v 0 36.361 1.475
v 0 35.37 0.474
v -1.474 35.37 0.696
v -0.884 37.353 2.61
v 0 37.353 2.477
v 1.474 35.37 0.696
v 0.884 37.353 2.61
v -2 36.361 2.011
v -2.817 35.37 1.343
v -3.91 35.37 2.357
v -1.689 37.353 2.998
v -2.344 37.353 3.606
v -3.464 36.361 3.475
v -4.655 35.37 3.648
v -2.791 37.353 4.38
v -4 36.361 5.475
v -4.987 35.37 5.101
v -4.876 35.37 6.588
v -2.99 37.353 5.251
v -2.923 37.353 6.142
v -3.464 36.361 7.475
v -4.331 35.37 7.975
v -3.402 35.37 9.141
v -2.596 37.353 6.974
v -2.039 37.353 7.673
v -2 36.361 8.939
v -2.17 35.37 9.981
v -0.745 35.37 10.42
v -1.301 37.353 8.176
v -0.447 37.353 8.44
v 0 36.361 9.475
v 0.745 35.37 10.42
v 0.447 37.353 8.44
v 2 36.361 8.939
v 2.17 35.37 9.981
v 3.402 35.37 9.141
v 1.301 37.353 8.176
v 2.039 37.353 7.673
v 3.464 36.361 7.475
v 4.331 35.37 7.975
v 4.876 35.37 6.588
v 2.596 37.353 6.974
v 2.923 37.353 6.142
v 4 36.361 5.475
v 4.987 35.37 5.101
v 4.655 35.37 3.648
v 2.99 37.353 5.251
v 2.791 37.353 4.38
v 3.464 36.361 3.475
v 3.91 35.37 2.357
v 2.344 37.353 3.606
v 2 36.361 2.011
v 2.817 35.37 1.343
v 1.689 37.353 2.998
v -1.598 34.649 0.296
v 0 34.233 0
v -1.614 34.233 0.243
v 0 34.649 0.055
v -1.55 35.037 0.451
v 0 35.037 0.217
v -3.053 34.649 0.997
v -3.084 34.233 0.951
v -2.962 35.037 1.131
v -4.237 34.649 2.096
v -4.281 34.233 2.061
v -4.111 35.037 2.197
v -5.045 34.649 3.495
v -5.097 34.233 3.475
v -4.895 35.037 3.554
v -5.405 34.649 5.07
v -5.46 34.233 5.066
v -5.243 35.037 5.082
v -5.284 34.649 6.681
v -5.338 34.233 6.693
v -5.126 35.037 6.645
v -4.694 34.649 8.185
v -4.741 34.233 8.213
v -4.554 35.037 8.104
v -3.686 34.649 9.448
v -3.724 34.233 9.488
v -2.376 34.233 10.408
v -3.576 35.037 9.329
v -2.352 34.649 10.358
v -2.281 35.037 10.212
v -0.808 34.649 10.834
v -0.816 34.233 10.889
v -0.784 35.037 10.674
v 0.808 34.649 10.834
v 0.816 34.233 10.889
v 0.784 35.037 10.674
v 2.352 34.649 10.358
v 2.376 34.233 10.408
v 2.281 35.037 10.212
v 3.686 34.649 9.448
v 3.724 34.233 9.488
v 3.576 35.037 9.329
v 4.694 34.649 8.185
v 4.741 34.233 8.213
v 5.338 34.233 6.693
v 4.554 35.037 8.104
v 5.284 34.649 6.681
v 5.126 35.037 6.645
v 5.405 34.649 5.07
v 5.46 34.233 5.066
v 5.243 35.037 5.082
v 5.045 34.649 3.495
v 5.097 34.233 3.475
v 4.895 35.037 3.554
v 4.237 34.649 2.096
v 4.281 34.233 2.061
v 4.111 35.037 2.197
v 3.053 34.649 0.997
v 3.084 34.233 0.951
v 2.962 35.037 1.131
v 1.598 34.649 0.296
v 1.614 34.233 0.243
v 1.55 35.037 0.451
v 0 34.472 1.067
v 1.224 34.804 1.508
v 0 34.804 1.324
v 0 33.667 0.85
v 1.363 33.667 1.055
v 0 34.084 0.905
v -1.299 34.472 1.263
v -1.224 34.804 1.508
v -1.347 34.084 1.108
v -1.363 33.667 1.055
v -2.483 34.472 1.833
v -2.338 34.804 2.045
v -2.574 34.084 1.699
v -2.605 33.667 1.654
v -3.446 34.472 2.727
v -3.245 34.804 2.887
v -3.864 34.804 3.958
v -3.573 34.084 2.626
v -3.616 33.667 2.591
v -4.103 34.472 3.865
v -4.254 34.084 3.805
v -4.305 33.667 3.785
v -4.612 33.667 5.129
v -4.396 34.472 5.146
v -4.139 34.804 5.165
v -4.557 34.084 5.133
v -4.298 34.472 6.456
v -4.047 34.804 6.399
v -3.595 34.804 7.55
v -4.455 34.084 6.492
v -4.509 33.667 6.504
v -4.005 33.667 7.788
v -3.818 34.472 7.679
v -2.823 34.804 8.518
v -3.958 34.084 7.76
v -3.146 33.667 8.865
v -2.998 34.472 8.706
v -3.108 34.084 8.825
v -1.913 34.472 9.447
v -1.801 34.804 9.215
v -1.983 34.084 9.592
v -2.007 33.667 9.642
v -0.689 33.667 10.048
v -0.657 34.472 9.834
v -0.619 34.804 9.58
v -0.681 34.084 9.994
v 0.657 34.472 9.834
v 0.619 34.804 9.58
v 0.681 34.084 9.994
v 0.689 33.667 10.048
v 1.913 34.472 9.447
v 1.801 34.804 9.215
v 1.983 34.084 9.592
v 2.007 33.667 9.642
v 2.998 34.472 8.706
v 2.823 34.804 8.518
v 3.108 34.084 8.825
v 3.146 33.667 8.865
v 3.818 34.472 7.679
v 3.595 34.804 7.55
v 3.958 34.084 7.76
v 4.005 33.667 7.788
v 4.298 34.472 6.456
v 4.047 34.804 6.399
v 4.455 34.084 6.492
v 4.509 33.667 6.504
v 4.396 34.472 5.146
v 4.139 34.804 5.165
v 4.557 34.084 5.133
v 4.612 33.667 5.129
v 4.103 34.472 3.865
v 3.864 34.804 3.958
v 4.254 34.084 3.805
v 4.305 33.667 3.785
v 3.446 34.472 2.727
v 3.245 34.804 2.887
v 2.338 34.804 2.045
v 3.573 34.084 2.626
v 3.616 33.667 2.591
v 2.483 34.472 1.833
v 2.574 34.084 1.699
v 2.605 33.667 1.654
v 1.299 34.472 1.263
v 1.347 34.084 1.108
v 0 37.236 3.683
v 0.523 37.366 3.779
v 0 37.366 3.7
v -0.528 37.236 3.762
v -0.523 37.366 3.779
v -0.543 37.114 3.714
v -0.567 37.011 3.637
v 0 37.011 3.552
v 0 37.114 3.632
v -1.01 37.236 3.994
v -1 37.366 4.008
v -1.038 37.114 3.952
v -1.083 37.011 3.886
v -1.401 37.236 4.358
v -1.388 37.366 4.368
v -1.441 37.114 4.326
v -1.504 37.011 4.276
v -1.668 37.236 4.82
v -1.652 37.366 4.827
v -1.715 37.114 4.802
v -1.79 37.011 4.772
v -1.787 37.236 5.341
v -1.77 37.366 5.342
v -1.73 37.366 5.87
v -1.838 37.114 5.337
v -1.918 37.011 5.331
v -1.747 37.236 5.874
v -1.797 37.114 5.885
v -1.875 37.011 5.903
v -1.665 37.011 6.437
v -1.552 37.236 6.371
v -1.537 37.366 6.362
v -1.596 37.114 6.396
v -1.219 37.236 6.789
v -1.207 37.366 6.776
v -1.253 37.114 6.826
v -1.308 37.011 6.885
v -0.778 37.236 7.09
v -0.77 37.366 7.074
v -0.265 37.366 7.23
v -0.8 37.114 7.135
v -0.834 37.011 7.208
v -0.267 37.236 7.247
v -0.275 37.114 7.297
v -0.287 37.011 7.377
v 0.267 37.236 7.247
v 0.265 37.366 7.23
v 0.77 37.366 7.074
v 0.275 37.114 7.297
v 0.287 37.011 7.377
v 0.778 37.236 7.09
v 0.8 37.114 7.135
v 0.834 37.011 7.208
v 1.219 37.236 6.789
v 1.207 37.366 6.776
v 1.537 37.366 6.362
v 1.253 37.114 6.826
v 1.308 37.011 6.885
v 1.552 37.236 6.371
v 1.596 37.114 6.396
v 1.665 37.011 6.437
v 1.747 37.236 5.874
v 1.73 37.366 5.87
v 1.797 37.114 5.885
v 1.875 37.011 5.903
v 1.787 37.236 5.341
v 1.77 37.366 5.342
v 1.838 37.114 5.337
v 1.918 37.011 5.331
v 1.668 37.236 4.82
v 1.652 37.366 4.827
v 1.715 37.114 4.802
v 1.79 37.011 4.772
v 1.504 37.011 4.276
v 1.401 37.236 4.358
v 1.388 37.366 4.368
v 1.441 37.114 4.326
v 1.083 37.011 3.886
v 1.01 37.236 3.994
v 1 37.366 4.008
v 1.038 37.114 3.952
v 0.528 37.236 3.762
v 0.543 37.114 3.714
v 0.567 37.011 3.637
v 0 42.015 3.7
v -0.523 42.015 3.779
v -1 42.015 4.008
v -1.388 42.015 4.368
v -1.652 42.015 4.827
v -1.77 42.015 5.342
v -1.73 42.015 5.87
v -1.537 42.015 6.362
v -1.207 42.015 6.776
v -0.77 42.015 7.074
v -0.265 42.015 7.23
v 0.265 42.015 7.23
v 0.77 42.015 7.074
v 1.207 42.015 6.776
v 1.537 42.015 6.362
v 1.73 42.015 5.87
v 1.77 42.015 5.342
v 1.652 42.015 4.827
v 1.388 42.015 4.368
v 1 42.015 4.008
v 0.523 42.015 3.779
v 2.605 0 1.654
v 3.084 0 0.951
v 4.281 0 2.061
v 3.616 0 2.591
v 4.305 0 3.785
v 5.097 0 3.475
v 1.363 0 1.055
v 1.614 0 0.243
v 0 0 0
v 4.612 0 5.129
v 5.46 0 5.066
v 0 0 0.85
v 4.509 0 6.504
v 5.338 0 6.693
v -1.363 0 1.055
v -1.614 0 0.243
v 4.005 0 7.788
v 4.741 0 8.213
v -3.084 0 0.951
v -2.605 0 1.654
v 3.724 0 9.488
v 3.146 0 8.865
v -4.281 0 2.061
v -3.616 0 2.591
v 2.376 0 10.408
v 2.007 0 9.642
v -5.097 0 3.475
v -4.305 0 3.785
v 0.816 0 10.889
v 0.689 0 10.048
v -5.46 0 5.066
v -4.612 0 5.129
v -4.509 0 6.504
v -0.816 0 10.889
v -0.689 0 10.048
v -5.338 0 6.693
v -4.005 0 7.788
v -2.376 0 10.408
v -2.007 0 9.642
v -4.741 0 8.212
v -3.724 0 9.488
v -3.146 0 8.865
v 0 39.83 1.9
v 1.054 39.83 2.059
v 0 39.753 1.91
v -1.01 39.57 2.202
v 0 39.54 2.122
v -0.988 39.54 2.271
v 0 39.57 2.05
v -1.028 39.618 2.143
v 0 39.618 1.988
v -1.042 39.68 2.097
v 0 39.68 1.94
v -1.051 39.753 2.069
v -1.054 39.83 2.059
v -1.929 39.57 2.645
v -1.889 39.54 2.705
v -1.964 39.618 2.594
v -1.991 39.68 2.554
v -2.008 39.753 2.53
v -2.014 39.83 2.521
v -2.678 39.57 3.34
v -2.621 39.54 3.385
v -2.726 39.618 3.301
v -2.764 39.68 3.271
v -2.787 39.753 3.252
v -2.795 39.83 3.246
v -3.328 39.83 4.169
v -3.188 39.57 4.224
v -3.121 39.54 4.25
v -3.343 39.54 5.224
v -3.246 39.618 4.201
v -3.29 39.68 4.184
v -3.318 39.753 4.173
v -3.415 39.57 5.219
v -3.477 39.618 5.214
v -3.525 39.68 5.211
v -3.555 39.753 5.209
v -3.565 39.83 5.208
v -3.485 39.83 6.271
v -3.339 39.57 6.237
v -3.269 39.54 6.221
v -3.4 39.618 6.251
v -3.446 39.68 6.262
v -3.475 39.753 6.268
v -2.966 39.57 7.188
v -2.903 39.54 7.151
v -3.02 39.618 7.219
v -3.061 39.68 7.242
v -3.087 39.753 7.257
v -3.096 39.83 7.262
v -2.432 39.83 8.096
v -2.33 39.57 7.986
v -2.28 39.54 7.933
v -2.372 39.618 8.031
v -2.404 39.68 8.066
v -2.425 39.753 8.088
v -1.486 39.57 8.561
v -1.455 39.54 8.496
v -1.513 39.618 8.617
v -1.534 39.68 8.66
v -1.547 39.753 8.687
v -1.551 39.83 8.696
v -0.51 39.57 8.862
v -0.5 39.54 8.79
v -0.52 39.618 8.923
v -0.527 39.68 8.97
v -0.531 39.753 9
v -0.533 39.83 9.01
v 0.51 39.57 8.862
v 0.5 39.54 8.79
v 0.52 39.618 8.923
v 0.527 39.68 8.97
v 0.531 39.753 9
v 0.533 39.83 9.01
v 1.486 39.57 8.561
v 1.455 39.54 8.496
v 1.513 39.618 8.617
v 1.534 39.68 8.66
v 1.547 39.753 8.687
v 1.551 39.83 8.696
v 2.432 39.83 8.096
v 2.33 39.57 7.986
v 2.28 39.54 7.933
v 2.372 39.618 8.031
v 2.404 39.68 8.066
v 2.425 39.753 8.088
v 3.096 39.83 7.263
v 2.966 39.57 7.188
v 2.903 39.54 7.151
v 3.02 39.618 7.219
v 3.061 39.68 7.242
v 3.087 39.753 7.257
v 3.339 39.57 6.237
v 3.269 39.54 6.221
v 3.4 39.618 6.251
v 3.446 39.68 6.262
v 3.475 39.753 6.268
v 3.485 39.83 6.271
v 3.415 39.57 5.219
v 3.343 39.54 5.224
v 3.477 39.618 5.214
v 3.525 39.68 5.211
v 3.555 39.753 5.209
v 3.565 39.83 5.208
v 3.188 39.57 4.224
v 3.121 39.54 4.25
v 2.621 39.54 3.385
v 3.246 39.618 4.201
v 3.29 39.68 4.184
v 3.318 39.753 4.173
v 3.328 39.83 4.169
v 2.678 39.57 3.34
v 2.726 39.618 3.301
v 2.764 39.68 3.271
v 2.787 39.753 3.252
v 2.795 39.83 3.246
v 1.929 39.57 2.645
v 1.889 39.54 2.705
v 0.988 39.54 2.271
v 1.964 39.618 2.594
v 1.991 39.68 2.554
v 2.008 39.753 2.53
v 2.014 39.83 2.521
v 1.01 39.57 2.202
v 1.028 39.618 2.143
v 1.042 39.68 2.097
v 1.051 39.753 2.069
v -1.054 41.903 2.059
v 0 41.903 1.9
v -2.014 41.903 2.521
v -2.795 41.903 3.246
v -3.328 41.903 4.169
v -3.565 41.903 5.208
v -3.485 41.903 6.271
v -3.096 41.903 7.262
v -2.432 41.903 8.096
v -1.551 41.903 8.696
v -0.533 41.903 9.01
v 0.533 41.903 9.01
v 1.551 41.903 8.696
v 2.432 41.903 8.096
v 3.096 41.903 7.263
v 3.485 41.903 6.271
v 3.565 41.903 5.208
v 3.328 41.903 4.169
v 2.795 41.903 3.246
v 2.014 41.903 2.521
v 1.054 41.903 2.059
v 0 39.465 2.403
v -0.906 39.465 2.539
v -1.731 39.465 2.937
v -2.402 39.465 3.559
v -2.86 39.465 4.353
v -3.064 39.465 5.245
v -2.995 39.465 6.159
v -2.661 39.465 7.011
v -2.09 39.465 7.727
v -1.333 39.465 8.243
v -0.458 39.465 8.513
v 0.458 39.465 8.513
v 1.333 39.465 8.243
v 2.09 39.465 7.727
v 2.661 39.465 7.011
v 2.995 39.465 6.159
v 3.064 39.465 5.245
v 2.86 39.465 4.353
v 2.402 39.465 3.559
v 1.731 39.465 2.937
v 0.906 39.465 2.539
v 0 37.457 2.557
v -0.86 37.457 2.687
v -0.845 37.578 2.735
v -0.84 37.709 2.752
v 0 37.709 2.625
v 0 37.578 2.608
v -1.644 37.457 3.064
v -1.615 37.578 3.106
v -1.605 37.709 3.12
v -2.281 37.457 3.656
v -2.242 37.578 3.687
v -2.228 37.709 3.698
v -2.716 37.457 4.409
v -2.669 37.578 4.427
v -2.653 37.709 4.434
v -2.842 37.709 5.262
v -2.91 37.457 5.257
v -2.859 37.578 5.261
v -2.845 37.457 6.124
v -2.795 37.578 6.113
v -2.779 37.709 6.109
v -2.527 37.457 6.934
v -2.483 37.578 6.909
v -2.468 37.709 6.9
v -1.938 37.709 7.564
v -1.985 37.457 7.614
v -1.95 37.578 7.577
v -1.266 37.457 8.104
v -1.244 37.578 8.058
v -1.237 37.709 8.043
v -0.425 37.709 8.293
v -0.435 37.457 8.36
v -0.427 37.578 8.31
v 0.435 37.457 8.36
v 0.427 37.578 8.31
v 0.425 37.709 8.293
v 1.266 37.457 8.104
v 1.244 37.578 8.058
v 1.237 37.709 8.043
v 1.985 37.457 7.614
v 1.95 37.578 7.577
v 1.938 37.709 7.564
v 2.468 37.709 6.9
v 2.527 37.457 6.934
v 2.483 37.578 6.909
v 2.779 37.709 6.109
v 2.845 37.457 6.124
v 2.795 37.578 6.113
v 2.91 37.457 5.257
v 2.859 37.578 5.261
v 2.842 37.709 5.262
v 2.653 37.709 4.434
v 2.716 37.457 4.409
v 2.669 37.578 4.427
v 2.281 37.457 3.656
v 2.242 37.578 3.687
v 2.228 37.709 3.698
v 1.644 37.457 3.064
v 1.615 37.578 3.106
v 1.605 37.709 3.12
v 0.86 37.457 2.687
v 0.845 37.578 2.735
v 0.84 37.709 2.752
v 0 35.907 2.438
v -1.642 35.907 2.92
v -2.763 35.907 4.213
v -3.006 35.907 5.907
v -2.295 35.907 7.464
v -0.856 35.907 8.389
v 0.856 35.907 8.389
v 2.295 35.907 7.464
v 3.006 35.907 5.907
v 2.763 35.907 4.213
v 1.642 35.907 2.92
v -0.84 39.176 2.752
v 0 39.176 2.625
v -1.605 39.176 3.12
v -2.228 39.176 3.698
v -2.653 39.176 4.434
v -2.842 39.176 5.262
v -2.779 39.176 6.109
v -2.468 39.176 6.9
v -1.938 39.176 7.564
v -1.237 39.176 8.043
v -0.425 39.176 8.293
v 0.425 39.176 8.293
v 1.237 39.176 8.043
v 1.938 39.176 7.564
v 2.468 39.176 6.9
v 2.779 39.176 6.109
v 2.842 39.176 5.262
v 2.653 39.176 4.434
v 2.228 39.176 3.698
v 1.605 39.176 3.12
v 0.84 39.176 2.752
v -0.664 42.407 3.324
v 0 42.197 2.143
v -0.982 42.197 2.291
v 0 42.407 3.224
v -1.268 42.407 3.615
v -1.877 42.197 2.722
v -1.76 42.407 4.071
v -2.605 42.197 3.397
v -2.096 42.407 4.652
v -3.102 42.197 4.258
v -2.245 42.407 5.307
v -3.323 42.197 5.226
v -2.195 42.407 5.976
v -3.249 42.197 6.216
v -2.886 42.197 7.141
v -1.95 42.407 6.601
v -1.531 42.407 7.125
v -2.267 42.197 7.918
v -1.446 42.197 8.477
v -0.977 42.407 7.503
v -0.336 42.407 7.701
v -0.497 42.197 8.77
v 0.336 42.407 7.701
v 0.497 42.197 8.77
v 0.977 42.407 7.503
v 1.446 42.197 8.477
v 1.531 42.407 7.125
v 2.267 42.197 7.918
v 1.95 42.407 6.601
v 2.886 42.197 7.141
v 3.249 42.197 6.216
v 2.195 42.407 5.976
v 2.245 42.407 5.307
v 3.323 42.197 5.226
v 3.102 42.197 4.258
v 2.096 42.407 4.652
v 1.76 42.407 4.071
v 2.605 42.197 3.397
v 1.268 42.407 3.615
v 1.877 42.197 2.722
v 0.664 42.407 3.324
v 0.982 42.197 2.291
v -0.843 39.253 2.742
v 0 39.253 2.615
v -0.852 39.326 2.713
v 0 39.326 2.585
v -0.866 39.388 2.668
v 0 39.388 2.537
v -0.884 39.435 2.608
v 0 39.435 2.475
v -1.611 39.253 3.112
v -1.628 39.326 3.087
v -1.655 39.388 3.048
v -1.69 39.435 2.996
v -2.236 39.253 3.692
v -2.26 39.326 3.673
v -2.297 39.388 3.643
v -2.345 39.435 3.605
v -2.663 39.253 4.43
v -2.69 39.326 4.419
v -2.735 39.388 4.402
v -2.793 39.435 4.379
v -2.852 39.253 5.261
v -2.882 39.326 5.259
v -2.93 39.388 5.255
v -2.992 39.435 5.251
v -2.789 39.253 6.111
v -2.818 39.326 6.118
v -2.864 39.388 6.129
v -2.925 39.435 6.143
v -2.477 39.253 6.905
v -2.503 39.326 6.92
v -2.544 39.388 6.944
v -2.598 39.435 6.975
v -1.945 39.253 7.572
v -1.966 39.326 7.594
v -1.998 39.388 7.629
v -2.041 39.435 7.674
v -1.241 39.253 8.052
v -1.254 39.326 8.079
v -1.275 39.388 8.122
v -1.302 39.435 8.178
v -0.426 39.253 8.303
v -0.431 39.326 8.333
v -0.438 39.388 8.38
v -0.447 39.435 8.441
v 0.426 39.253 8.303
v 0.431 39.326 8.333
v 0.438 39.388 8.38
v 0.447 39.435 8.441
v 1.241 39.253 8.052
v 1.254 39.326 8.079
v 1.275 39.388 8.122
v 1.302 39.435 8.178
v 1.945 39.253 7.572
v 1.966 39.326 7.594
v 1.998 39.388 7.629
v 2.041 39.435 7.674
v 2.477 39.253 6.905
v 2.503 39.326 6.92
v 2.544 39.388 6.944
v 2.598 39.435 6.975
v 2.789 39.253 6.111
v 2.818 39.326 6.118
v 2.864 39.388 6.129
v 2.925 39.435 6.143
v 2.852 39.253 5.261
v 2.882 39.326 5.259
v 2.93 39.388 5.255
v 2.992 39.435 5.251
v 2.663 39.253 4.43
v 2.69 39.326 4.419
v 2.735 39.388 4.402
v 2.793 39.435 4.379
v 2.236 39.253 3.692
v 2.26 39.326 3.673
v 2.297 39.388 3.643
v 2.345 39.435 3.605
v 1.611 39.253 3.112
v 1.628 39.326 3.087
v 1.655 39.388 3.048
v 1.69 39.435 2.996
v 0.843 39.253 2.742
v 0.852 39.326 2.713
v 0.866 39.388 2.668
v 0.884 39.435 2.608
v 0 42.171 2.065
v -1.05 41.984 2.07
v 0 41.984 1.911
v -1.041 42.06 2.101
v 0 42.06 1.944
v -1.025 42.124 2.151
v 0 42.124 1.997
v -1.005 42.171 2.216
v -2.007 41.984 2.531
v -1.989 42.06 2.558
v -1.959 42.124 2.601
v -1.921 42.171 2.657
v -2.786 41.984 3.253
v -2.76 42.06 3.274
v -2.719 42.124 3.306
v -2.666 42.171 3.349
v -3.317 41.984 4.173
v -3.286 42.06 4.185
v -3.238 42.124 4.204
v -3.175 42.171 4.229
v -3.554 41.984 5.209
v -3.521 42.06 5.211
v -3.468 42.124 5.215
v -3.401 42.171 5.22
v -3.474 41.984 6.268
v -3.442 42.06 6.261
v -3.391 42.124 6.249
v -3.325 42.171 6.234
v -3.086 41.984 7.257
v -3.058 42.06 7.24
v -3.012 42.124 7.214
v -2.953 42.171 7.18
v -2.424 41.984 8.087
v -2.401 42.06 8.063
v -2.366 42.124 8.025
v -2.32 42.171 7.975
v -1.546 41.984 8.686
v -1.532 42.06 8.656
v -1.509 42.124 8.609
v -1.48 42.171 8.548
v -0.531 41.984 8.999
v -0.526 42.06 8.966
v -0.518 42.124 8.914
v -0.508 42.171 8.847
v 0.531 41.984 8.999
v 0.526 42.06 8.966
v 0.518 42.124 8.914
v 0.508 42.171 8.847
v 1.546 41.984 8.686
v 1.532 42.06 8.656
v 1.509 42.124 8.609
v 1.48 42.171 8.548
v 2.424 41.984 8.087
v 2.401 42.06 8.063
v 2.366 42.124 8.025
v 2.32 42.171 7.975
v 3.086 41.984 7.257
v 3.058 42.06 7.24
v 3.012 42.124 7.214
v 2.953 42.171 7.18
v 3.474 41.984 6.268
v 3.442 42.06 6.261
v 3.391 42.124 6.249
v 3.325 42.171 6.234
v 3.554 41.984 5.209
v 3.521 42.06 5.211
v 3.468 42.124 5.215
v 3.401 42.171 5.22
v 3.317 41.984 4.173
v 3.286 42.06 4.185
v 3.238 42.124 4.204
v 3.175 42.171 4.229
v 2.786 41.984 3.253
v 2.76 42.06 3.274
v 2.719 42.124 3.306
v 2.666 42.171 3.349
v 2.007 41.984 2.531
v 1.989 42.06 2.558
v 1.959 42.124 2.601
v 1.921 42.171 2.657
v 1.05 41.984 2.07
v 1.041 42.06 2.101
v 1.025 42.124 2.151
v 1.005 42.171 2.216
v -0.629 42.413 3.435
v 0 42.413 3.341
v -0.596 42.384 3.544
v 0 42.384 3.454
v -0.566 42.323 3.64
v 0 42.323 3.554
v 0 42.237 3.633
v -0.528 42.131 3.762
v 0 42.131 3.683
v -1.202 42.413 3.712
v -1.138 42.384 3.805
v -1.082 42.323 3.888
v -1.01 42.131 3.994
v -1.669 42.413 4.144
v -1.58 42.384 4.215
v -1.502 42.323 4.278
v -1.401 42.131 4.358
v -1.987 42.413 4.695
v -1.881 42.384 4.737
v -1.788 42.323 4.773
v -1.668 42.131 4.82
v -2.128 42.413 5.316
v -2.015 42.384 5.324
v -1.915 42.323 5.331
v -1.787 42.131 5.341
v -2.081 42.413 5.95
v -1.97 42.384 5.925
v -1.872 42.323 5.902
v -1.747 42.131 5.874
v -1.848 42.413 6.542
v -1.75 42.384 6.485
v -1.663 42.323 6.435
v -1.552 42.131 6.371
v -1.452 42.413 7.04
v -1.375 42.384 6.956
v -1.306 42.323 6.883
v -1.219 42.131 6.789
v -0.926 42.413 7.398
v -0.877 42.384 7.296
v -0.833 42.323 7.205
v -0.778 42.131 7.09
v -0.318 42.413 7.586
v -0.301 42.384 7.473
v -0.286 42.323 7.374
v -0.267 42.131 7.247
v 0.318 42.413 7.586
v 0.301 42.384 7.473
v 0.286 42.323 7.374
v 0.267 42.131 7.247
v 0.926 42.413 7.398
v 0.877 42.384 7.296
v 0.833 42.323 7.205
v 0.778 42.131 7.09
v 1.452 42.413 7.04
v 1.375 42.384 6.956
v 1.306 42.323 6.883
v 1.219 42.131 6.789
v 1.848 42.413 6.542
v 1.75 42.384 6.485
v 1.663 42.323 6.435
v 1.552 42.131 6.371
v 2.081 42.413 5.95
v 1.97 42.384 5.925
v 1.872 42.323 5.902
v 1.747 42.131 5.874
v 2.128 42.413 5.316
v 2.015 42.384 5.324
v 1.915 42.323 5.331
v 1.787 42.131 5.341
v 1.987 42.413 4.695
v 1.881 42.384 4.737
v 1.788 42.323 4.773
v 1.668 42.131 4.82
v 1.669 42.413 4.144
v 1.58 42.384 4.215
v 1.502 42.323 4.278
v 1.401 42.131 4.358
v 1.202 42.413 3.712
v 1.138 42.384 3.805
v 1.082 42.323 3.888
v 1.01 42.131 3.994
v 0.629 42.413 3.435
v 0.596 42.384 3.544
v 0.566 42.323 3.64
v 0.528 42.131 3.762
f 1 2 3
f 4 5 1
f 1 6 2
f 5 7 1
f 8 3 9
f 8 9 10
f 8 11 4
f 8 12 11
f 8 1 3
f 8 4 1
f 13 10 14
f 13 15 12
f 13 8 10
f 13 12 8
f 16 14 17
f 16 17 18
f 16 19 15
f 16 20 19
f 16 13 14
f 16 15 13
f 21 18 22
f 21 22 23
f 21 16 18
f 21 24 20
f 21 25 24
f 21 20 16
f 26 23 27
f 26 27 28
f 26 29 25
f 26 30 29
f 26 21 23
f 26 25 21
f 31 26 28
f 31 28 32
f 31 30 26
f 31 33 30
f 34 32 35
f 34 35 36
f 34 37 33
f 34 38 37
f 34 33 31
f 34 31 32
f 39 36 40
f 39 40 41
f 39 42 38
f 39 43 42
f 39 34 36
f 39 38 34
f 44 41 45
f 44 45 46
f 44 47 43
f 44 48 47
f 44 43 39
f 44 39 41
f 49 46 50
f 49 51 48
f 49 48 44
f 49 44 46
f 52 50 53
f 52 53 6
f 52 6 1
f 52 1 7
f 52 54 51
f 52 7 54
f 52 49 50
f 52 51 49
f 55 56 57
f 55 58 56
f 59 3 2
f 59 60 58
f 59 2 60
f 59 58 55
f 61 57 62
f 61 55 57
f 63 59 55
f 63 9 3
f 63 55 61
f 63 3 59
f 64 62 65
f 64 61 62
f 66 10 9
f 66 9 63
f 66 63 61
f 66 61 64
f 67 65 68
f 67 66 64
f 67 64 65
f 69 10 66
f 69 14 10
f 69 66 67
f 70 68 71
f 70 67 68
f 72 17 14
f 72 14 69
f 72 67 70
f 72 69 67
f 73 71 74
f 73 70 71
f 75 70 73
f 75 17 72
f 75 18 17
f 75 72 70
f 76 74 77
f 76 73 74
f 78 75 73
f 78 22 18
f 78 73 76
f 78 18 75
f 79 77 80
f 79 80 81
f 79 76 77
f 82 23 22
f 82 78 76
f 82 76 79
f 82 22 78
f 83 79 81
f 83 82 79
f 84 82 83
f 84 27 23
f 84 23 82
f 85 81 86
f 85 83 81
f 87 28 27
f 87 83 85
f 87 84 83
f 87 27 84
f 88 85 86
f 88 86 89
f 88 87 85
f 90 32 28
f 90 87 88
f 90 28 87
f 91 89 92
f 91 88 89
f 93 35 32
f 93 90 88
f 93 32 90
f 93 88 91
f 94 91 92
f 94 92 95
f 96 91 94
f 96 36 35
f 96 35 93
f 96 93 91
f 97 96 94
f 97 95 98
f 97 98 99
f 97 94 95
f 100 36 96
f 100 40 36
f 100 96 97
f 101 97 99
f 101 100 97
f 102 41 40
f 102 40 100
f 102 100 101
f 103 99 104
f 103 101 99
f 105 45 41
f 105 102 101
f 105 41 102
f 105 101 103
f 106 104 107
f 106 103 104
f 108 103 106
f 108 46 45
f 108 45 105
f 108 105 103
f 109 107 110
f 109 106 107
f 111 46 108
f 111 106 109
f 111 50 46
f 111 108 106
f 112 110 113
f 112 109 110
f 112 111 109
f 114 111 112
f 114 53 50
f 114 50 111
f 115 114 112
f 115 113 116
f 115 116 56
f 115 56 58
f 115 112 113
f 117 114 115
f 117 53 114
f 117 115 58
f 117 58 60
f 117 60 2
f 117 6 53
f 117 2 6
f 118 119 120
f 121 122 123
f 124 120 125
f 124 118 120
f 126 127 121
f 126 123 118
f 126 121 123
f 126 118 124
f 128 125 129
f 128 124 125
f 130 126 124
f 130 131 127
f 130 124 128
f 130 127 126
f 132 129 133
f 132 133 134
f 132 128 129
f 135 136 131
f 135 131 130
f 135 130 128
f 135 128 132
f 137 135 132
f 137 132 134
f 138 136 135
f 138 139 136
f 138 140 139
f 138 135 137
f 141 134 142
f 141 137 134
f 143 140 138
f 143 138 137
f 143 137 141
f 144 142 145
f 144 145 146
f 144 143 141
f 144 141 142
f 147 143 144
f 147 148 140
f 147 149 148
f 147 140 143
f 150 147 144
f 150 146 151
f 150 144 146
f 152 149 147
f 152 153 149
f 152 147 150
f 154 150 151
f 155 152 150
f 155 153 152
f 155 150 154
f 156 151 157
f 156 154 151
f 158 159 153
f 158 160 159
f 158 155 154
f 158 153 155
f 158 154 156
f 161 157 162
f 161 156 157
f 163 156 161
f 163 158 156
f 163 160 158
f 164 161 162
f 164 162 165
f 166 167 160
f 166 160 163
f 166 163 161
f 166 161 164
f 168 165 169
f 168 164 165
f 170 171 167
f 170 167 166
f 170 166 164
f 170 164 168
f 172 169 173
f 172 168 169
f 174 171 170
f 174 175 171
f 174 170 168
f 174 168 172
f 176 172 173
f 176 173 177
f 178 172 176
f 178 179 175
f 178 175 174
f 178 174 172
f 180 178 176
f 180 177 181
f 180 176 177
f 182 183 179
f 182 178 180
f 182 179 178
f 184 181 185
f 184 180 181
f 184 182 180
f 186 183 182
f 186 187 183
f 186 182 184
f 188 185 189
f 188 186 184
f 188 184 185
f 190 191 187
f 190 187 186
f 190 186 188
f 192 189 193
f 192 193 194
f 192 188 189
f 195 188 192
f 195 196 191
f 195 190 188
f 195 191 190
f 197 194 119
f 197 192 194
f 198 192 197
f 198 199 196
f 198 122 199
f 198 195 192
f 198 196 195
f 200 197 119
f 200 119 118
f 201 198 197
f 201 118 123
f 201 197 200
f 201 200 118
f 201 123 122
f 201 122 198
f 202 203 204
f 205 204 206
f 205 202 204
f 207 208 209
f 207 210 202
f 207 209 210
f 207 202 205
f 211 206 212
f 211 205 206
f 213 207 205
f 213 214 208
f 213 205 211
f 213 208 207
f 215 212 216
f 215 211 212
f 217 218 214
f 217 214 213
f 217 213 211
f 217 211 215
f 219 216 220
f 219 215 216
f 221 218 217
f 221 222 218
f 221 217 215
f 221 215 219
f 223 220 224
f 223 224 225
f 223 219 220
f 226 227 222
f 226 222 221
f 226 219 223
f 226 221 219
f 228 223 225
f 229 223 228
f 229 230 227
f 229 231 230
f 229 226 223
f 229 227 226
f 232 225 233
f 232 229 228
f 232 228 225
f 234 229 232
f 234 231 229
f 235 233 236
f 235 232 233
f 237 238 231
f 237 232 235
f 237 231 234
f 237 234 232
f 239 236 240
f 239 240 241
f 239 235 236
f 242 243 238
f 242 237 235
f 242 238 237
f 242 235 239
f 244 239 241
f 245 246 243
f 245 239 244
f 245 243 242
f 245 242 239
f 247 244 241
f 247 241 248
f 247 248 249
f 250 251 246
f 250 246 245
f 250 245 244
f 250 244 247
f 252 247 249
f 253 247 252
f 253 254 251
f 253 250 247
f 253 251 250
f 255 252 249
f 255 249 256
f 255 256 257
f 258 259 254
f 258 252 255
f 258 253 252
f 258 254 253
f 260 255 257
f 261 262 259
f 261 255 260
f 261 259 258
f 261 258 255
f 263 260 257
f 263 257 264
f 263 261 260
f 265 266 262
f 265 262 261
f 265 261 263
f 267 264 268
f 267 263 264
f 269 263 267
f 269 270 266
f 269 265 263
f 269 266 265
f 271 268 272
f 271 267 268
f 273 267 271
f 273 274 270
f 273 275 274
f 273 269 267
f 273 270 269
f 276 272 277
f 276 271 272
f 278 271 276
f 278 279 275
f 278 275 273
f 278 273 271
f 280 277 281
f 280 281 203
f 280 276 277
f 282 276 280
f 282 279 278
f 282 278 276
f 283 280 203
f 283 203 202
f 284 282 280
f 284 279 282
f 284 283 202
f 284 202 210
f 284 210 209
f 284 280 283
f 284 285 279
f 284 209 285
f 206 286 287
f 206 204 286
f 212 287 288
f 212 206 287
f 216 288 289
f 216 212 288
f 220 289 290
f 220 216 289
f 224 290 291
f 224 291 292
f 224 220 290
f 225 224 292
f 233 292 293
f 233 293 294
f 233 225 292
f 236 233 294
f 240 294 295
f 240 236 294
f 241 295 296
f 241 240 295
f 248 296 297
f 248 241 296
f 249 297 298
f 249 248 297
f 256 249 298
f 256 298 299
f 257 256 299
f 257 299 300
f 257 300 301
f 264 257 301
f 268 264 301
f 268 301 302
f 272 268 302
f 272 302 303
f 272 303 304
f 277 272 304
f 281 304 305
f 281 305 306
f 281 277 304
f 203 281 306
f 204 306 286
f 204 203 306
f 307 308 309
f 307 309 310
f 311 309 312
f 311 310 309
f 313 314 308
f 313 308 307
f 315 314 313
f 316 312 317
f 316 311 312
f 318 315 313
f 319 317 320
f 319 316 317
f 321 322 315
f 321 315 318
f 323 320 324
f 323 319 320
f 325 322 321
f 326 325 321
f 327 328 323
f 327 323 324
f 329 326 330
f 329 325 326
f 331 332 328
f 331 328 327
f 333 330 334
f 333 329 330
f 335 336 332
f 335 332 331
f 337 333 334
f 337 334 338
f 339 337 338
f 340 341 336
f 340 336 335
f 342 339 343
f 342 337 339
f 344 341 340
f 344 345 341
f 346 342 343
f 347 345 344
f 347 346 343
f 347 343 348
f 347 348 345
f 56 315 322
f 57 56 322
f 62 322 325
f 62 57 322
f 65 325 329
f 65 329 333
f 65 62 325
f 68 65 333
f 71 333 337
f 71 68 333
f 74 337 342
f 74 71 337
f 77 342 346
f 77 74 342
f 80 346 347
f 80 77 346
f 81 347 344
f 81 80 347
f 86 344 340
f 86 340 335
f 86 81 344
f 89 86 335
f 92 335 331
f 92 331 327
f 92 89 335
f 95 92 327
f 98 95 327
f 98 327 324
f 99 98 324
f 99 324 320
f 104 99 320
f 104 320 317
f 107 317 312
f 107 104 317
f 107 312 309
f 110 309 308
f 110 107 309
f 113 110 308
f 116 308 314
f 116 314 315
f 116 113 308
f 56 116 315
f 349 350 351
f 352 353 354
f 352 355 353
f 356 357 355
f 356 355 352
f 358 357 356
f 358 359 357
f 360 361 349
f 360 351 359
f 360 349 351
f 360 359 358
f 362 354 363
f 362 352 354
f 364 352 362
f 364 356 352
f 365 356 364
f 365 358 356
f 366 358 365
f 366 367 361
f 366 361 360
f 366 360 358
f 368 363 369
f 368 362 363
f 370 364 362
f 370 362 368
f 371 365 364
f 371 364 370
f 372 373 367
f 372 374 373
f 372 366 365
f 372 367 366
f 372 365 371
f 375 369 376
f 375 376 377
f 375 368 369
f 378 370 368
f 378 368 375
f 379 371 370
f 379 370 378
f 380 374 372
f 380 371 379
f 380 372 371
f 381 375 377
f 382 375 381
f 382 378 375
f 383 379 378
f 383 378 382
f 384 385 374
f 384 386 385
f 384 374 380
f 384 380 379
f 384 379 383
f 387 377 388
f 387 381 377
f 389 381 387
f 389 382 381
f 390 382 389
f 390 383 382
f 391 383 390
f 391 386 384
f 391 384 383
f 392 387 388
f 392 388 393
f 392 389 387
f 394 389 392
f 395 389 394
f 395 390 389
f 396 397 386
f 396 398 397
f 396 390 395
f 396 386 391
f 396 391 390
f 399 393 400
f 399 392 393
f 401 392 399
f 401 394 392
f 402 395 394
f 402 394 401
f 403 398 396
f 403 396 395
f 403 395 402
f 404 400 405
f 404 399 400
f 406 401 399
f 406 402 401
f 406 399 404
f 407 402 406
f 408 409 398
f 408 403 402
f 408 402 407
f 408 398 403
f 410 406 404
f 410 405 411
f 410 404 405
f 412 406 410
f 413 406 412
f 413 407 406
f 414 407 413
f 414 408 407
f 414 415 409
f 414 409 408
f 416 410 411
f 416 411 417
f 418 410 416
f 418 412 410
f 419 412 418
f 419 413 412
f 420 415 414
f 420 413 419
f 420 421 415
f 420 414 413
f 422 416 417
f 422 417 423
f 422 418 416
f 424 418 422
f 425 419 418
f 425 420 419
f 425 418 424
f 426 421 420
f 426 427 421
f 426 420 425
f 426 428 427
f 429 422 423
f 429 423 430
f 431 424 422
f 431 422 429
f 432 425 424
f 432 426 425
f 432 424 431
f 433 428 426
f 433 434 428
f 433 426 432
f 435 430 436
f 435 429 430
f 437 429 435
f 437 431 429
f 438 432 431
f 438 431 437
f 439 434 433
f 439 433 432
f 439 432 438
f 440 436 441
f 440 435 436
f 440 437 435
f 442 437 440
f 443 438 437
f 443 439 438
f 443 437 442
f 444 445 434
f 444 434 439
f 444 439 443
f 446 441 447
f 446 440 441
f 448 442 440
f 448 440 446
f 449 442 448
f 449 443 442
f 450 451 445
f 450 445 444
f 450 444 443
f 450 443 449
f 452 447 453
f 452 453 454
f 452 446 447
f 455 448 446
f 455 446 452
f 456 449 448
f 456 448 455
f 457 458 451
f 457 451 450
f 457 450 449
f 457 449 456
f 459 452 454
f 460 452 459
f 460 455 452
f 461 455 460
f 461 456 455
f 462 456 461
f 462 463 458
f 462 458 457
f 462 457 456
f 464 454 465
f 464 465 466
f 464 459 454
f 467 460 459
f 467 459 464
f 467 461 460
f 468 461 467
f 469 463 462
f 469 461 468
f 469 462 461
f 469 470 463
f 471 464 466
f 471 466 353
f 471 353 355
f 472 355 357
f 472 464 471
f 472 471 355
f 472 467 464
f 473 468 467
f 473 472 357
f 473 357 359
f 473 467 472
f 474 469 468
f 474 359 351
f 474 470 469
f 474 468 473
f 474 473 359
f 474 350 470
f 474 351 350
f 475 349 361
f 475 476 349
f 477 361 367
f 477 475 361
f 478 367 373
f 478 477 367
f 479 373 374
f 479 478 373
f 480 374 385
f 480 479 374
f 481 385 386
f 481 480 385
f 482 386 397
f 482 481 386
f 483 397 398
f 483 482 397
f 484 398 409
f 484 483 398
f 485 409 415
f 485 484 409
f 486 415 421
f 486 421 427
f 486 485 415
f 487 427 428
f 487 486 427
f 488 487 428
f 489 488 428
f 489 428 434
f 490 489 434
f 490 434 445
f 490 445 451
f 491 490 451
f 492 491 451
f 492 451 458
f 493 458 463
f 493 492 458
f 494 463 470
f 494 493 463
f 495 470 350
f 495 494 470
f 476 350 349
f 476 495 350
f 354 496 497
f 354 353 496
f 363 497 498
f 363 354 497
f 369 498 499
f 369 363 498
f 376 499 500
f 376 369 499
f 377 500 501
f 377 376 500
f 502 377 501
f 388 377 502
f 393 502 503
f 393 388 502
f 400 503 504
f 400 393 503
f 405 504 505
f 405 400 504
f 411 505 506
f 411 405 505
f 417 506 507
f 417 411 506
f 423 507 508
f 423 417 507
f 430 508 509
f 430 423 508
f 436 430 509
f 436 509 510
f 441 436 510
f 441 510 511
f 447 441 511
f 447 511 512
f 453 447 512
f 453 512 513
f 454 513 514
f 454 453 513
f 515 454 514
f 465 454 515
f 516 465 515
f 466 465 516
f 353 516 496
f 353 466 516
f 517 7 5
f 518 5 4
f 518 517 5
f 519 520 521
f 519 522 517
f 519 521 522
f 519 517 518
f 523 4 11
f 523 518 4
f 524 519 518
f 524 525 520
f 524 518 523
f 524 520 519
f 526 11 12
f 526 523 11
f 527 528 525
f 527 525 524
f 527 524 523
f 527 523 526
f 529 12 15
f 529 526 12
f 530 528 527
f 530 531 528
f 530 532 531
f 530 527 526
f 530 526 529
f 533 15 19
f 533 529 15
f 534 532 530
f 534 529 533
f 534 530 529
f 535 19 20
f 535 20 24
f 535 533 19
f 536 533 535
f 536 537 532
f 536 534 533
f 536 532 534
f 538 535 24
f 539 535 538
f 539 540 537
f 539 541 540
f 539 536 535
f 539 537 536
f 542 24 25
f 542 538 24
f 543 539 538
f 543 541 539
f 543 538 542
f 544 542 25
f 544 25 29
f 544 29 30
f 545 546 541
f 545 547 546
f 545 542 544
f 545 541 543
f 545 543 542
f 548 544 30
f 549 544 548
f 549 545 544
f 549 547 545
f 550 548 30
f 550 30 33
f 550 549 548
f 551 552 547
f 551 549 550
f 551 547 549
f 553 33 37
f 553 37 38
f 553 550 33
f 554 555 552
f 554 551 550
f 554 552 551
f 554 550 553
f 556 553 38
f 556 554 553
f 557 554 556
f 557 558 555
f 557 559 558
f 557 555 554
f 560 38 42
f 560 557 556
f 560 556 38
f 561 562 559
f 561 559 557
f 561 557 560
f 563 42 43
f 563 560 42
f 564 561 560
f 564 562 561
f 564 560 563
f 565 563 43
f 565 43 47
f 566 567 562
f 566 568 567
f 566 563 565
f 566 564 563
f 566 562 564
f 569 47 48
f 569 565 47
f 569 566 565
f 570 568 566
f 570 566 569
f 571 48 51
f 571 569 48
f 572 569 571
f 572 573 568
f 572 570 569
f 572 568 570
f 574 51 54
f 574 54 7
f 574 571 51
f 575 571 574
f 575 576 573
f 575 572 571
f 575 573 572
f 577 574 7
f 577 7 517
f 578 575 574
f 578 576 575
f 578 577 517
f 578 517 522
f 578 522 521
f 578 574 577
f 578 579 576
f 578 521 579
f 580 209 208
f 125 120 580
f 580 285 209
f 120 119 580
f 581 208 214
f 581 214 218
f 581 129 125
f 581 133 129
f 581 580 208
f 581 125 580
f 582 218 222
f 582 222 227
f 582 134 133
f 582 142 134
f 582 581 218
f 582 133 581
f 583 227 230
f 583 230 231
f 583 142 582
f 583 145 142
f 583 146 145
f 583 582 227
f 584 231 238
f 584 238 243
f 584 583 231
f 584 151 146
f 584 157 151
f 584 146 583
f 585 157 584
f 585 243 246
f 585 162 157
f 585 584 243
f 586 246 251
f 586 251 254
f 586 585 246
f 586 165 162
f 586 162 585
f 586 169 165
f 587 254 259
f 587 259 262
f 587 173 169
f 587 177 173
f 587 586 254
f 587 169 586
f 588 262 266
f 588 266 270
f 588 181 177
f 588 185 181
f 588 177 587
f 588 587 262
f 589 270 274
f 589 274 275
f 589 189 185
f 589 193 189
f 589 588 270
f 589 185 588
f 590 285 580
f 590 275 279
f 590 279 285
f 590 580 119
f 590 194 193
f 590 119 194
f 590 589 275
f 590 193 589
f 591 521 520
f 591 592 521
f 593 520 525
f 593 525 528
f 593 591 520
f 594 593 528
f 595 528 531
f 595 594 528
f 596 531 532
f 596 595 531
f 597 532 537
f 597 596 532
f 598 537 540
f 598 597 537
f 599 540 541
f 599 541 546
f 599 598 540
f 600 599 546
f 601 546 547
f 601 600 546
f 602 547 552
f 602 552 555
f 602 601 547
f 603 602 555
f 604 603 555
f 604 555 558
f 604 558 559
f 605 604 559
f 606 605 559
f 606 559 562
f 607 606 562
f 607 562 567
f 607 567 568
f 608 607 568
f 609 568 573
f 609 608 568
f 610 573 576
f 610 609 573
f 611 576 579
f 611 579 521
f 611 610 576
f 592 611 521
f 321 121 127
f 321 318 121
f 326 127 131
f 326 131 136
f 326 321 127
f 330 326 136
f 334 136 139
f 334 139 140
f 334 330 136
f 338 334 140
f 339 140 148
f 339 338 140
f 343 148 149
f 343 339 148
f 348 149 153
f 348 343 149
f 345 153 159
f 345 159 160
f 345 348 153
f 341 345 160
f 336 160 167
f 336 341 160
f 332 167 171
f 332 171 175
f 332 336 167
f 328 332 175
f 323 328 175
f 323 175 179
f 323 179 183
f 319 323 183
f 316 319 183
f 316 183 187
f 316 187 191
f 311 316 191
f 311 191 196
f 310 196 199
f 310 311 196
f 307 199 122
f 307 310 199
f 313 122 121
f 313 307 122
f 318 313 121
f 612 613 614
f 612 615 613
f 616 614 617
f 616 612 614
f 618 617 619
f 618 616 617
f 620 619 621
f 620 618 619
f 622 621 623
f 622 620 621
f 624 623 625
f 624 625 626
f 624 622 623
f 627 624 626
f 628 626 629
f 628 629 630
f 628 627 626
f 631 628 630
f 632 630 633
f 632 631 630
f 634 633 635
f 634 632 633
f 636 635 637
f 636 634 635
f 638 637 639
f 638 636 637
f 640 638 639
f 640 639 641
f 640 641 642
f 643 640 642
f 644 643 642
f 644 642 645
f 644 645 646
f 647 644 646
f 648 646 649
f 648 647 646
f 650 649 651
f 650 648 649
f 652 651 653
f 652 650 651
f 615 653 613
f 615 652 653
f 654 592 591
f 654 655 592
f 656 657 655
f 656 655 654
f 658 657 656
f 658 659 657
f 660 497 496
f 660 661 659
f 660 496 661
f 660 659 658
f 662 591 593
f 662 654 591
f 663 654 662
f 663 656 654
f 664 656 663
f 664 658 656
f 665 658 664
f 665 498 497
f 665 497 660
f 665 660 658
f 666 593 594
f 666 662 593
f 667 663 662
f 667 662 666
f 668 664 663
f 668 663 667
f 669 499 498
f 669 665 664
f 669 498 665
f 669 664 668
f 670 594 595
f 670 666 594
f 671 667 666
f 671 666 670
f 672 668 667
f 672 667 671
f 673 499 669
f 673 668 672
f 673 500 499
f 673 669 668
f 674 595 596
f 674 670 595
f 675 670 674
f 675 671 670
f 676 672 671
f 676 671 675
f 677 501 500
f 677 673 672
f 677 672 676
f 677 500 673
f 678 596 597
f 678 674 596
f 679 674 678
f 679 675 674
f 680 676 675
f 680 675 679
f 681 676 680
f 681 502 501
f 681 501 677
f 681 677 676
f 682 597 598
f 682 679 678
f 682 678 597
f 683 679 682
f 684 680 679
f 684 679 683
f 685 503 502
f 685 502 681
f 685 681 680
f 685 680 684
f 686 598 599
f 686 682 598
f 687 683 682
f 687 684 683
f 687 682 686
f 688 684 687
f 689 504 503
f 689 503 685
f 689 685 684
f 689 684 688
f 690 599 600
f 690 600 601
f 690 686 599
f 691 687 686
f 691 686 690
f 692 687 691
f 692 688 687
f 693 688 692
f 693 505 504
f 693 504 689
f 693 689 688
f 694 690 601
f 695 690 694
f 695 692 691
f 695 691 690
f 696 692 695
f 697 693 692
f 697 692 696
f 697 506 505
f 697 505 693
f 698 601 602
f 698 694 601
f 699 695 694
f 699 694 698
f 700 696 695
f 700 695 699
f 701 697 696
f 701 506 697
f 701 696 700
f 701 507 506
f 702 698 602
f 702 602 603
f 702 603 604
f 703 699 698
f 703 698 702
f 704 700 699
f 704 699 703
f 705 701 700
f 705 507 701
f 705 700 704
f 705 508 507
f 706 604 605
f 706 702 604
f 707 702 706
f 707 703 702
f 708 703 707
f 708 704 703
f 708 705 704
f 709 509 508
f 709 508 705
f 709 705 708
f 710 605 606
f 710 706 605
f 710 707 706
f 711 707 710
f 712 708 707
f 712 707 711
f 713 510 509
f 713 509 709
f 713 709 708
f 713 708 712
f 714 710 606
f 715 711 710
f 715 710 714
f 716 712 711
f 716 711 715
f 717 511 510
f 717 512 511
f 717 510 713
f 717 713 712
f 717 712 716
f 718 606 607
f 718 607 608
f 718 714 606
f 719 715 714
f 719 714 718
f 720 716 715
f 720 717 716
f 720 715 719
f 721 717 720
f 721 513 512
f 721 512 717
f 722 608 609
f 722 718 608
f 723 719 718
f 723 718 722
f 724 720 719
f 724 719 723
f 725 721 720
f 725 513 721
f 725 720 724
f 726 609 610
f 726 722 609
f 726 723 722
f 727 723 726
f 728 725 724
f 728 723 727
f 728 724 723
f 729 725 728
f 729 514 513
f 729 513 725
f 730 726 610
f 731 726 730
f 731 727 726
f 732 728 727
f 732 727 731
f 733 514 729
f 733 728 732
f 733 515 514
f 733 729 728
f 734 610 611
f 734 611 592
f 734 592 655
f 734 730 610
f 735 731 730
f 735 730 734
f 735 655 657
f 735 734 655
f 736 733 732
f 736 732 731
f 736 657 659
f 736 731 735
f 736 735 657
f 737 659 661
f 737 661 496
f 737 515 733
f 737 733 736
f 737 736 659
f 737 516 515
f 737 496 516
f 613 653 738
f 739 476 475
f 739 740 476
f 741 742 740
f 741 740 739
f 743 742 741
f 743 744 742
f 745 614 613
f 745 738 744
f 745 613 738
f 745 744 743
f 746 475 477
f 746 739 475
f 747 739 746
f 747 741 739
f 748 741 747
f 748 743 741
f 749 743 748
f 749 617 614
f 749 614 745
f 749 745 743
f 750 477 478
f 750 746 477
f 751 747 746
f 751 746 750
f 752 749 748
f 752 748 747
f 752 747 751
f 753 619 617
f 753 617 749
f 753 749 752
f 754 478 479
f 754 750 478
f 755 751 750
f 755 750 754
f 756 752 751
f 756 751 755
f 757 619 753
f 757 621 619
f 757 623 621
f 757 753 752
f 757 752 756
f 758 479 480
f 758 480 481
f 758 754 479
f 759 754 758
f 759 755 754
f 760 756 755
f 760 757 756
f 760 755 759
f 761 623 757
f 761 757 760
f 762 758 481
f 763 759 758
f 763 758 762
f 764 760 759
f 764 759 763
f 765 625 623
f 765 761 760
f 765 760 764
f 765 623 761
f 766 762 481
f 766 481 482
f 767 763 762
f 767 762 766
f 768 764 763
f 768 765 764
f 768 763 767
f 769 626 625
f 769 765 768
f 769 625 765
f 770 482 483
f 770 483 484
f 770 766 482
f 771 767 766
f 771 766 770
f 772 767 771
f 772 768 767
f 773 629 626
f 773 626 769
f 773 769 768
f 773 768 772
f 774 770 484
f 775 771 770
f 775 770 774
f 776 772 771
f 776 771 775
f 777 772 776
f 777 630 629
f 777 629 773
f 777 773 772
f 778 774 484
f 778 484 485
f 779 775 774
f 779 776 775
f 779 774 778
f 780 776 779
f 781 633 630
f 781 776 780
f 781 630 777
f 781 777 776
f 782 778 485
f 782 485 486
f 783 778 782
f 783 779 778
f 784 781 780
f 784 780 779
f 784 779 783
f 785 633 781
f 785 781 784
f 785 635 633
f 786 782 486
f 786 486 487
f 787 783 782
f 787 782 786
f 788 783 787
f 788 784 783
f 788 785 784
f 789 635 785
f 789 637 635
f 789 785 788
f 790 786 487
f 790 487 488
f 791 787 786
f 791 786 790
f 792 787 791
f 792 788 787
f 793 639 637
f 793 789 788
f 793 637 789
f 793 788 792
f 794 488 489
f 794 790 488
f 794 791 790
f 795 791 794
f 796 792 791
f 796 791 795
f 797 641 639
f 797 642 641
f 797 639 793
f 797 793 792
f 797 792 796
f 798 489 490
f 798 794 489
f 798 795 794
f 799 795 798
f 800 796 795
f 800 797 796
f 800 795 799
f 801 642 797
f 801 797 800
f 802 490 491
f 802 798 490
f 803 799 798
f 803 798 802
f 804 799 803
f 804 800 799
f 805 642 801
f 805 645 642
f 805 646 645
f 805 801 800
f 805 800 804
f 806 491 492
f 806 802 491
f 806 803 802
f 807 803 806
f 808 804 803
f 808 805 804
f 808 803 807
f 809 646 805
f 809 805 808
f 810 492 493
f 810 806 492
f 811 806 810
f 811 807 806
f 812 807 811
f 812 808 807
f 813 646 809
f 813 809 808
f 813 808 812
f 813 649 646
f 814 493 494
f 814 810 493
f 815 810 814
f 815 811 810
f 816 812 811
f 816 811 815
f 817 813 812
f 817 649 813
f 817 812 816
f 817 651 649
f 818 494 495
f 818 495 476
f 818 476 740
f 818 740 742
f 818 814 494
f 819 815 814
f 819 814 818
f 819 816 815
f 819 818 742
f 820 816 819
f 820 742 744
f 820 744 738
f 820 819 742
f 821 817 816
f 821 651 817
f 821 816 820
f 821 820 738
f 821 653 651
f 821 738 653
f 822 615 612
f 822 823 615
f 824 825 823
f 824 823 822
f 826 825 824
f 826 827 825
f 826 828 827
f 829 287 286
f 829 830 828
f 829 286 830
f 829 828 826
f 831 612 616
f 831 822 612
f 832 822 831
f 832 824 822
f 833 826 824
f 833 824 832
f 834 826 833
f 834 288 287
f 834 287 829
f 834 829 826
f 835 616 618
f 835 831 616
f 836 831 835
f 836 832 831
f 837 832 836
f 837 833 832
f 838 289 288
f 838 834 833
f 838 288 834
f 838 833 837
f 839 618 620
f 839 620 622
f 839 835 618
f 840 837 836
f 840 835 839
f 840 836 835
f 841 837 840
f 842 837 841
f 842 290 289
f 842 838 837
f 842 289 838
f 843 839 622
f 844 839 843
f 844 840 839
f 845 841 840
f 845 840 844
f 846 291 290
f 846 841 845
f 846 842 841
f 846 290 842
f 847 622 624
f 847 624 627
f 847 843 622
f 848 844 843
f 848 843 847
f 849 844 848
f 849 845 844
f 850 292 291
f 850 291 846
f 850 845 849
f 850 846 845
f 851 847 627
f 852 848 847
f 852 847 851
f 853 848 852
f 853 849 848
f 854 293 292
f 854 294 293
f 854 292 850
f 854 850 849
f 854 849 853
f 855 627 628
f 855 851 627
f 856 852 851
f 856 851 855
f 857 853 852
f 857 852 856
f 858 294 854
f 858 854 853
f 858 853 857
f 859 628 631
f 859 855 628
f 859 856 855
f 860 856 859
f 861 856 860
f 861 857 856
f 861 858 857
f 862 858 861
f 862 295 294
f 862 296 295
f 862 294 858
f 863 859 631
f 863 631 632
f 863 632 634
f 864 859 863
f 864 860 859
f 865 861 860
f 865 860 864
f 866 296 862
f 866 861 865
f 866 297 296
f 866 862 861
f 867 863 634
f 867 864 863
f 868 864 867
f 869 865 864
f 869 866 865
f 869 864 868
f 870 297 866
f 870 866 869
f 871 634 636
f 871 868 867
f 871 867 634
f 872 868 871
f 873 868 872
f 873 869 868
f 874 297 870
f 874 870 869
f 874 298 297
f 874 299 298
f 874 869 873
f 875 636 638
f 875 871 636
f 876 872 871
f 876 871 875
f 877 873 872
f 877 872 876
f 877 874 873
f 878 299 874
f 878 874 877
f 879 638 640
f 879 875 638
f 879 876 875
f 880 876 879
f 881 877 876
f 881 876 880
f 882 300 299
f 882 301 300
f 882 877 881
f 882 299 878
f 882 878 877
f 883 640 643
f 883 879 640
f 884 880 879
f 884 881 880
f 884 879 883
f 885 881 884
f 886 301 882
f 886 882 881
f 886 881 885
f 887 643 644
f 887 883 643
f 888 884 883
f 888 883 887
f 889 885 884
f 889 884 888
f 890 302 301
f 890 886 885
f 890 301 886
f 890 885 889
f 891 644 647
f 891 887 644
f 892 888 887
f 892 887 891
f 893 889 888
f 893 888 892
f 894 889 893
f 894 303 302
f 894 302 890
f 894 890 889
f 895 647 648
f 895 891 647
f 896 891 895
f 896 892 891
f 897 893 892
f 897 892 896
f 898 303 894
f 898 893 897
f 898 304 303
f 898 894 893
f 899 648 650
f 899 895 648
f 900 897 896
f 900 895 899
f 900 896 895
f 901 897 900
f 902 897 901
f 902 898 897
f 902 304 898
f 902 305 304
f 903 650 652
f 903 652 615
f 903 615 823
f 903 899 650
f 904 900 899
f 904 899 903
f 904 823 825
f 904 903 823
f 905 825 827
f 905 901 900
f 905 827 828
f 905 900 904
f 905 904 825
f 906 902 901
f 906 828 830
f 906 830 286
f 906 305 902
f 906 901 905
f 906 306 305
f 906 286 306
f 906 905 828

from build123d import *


with BuildPart() as part:
    # Sketch1 → Revolve1 (revolve)
    with BuildSketch(Plane(origin=(0, 0, 0), x_dir=(0, 0, -1), z_dir=(1, 0, 0))):
        with BuildLine():
            Line((0, 0), (0, 34.232769388))
            ThreePointArc((0, 34.232769388), (-0.123261782, 34.848597478), (-0.474055296, 35.369540484))
            Line((-0.474055296, 35.369540484), (-2.47685772, 37.353268599))
            ThreePointArc((-2.47685772, 37.353268599), (-2.586480693, 37.516063288), (-2.625, 37.708509566))
            Line((-2.625, 37.708509566), (-2.625, 39.175538739))
            ThreePointArc((-2.625, 39.175538739), (-2.563006002, 39.358167168), (-2.402645714, 39.465316487))
            Line((-2.402645714, 39.465316487), (-2.122354286, 39.540420349))
            ThreePointArc((-2.122354286, 39.540420349), (-1.961993998, 39.647569668), (-1.9, 39.830198096))
            Line((-1.9, 39.830198096), (-1.9, 41.902814528))
            ThreePointArc((-1.9, 41.902814528), (-1.968512625, 42.093637994), (-2.142757301, 42.197302683))
            Line((-2.142757301, 42.197302683), (-3.223676402, 42.407412072))
            ThreePointArc((-3.223676402, 42.407412072), (-3.554431288, 42.323411032), (-3.7, 42.014761198))
            Line((-3.7, 42.014761198), (-3.7, 37.365776148))
            ThreePointArc((-3.7, 37.365776148), (-3.661480693, 37.17332987), (-3.55185772, 37.010535181))
            Line((-3.55185772, 37.010535181), (-1.324055296, 34.803949923))
            ThreePointArc((-1.324055296, 34.803949923), (-0.973261782, 34.283006917), (-0.85, 33.667178827))
            Line((-0.85, 33.667178827), (-0.85, 0))
            Line((-0.85, 0), (0, 0))
        make_face()
    revolve(axis=Axis((0, 0, 5.475), (0, 1, 0)))


solid = part.part
